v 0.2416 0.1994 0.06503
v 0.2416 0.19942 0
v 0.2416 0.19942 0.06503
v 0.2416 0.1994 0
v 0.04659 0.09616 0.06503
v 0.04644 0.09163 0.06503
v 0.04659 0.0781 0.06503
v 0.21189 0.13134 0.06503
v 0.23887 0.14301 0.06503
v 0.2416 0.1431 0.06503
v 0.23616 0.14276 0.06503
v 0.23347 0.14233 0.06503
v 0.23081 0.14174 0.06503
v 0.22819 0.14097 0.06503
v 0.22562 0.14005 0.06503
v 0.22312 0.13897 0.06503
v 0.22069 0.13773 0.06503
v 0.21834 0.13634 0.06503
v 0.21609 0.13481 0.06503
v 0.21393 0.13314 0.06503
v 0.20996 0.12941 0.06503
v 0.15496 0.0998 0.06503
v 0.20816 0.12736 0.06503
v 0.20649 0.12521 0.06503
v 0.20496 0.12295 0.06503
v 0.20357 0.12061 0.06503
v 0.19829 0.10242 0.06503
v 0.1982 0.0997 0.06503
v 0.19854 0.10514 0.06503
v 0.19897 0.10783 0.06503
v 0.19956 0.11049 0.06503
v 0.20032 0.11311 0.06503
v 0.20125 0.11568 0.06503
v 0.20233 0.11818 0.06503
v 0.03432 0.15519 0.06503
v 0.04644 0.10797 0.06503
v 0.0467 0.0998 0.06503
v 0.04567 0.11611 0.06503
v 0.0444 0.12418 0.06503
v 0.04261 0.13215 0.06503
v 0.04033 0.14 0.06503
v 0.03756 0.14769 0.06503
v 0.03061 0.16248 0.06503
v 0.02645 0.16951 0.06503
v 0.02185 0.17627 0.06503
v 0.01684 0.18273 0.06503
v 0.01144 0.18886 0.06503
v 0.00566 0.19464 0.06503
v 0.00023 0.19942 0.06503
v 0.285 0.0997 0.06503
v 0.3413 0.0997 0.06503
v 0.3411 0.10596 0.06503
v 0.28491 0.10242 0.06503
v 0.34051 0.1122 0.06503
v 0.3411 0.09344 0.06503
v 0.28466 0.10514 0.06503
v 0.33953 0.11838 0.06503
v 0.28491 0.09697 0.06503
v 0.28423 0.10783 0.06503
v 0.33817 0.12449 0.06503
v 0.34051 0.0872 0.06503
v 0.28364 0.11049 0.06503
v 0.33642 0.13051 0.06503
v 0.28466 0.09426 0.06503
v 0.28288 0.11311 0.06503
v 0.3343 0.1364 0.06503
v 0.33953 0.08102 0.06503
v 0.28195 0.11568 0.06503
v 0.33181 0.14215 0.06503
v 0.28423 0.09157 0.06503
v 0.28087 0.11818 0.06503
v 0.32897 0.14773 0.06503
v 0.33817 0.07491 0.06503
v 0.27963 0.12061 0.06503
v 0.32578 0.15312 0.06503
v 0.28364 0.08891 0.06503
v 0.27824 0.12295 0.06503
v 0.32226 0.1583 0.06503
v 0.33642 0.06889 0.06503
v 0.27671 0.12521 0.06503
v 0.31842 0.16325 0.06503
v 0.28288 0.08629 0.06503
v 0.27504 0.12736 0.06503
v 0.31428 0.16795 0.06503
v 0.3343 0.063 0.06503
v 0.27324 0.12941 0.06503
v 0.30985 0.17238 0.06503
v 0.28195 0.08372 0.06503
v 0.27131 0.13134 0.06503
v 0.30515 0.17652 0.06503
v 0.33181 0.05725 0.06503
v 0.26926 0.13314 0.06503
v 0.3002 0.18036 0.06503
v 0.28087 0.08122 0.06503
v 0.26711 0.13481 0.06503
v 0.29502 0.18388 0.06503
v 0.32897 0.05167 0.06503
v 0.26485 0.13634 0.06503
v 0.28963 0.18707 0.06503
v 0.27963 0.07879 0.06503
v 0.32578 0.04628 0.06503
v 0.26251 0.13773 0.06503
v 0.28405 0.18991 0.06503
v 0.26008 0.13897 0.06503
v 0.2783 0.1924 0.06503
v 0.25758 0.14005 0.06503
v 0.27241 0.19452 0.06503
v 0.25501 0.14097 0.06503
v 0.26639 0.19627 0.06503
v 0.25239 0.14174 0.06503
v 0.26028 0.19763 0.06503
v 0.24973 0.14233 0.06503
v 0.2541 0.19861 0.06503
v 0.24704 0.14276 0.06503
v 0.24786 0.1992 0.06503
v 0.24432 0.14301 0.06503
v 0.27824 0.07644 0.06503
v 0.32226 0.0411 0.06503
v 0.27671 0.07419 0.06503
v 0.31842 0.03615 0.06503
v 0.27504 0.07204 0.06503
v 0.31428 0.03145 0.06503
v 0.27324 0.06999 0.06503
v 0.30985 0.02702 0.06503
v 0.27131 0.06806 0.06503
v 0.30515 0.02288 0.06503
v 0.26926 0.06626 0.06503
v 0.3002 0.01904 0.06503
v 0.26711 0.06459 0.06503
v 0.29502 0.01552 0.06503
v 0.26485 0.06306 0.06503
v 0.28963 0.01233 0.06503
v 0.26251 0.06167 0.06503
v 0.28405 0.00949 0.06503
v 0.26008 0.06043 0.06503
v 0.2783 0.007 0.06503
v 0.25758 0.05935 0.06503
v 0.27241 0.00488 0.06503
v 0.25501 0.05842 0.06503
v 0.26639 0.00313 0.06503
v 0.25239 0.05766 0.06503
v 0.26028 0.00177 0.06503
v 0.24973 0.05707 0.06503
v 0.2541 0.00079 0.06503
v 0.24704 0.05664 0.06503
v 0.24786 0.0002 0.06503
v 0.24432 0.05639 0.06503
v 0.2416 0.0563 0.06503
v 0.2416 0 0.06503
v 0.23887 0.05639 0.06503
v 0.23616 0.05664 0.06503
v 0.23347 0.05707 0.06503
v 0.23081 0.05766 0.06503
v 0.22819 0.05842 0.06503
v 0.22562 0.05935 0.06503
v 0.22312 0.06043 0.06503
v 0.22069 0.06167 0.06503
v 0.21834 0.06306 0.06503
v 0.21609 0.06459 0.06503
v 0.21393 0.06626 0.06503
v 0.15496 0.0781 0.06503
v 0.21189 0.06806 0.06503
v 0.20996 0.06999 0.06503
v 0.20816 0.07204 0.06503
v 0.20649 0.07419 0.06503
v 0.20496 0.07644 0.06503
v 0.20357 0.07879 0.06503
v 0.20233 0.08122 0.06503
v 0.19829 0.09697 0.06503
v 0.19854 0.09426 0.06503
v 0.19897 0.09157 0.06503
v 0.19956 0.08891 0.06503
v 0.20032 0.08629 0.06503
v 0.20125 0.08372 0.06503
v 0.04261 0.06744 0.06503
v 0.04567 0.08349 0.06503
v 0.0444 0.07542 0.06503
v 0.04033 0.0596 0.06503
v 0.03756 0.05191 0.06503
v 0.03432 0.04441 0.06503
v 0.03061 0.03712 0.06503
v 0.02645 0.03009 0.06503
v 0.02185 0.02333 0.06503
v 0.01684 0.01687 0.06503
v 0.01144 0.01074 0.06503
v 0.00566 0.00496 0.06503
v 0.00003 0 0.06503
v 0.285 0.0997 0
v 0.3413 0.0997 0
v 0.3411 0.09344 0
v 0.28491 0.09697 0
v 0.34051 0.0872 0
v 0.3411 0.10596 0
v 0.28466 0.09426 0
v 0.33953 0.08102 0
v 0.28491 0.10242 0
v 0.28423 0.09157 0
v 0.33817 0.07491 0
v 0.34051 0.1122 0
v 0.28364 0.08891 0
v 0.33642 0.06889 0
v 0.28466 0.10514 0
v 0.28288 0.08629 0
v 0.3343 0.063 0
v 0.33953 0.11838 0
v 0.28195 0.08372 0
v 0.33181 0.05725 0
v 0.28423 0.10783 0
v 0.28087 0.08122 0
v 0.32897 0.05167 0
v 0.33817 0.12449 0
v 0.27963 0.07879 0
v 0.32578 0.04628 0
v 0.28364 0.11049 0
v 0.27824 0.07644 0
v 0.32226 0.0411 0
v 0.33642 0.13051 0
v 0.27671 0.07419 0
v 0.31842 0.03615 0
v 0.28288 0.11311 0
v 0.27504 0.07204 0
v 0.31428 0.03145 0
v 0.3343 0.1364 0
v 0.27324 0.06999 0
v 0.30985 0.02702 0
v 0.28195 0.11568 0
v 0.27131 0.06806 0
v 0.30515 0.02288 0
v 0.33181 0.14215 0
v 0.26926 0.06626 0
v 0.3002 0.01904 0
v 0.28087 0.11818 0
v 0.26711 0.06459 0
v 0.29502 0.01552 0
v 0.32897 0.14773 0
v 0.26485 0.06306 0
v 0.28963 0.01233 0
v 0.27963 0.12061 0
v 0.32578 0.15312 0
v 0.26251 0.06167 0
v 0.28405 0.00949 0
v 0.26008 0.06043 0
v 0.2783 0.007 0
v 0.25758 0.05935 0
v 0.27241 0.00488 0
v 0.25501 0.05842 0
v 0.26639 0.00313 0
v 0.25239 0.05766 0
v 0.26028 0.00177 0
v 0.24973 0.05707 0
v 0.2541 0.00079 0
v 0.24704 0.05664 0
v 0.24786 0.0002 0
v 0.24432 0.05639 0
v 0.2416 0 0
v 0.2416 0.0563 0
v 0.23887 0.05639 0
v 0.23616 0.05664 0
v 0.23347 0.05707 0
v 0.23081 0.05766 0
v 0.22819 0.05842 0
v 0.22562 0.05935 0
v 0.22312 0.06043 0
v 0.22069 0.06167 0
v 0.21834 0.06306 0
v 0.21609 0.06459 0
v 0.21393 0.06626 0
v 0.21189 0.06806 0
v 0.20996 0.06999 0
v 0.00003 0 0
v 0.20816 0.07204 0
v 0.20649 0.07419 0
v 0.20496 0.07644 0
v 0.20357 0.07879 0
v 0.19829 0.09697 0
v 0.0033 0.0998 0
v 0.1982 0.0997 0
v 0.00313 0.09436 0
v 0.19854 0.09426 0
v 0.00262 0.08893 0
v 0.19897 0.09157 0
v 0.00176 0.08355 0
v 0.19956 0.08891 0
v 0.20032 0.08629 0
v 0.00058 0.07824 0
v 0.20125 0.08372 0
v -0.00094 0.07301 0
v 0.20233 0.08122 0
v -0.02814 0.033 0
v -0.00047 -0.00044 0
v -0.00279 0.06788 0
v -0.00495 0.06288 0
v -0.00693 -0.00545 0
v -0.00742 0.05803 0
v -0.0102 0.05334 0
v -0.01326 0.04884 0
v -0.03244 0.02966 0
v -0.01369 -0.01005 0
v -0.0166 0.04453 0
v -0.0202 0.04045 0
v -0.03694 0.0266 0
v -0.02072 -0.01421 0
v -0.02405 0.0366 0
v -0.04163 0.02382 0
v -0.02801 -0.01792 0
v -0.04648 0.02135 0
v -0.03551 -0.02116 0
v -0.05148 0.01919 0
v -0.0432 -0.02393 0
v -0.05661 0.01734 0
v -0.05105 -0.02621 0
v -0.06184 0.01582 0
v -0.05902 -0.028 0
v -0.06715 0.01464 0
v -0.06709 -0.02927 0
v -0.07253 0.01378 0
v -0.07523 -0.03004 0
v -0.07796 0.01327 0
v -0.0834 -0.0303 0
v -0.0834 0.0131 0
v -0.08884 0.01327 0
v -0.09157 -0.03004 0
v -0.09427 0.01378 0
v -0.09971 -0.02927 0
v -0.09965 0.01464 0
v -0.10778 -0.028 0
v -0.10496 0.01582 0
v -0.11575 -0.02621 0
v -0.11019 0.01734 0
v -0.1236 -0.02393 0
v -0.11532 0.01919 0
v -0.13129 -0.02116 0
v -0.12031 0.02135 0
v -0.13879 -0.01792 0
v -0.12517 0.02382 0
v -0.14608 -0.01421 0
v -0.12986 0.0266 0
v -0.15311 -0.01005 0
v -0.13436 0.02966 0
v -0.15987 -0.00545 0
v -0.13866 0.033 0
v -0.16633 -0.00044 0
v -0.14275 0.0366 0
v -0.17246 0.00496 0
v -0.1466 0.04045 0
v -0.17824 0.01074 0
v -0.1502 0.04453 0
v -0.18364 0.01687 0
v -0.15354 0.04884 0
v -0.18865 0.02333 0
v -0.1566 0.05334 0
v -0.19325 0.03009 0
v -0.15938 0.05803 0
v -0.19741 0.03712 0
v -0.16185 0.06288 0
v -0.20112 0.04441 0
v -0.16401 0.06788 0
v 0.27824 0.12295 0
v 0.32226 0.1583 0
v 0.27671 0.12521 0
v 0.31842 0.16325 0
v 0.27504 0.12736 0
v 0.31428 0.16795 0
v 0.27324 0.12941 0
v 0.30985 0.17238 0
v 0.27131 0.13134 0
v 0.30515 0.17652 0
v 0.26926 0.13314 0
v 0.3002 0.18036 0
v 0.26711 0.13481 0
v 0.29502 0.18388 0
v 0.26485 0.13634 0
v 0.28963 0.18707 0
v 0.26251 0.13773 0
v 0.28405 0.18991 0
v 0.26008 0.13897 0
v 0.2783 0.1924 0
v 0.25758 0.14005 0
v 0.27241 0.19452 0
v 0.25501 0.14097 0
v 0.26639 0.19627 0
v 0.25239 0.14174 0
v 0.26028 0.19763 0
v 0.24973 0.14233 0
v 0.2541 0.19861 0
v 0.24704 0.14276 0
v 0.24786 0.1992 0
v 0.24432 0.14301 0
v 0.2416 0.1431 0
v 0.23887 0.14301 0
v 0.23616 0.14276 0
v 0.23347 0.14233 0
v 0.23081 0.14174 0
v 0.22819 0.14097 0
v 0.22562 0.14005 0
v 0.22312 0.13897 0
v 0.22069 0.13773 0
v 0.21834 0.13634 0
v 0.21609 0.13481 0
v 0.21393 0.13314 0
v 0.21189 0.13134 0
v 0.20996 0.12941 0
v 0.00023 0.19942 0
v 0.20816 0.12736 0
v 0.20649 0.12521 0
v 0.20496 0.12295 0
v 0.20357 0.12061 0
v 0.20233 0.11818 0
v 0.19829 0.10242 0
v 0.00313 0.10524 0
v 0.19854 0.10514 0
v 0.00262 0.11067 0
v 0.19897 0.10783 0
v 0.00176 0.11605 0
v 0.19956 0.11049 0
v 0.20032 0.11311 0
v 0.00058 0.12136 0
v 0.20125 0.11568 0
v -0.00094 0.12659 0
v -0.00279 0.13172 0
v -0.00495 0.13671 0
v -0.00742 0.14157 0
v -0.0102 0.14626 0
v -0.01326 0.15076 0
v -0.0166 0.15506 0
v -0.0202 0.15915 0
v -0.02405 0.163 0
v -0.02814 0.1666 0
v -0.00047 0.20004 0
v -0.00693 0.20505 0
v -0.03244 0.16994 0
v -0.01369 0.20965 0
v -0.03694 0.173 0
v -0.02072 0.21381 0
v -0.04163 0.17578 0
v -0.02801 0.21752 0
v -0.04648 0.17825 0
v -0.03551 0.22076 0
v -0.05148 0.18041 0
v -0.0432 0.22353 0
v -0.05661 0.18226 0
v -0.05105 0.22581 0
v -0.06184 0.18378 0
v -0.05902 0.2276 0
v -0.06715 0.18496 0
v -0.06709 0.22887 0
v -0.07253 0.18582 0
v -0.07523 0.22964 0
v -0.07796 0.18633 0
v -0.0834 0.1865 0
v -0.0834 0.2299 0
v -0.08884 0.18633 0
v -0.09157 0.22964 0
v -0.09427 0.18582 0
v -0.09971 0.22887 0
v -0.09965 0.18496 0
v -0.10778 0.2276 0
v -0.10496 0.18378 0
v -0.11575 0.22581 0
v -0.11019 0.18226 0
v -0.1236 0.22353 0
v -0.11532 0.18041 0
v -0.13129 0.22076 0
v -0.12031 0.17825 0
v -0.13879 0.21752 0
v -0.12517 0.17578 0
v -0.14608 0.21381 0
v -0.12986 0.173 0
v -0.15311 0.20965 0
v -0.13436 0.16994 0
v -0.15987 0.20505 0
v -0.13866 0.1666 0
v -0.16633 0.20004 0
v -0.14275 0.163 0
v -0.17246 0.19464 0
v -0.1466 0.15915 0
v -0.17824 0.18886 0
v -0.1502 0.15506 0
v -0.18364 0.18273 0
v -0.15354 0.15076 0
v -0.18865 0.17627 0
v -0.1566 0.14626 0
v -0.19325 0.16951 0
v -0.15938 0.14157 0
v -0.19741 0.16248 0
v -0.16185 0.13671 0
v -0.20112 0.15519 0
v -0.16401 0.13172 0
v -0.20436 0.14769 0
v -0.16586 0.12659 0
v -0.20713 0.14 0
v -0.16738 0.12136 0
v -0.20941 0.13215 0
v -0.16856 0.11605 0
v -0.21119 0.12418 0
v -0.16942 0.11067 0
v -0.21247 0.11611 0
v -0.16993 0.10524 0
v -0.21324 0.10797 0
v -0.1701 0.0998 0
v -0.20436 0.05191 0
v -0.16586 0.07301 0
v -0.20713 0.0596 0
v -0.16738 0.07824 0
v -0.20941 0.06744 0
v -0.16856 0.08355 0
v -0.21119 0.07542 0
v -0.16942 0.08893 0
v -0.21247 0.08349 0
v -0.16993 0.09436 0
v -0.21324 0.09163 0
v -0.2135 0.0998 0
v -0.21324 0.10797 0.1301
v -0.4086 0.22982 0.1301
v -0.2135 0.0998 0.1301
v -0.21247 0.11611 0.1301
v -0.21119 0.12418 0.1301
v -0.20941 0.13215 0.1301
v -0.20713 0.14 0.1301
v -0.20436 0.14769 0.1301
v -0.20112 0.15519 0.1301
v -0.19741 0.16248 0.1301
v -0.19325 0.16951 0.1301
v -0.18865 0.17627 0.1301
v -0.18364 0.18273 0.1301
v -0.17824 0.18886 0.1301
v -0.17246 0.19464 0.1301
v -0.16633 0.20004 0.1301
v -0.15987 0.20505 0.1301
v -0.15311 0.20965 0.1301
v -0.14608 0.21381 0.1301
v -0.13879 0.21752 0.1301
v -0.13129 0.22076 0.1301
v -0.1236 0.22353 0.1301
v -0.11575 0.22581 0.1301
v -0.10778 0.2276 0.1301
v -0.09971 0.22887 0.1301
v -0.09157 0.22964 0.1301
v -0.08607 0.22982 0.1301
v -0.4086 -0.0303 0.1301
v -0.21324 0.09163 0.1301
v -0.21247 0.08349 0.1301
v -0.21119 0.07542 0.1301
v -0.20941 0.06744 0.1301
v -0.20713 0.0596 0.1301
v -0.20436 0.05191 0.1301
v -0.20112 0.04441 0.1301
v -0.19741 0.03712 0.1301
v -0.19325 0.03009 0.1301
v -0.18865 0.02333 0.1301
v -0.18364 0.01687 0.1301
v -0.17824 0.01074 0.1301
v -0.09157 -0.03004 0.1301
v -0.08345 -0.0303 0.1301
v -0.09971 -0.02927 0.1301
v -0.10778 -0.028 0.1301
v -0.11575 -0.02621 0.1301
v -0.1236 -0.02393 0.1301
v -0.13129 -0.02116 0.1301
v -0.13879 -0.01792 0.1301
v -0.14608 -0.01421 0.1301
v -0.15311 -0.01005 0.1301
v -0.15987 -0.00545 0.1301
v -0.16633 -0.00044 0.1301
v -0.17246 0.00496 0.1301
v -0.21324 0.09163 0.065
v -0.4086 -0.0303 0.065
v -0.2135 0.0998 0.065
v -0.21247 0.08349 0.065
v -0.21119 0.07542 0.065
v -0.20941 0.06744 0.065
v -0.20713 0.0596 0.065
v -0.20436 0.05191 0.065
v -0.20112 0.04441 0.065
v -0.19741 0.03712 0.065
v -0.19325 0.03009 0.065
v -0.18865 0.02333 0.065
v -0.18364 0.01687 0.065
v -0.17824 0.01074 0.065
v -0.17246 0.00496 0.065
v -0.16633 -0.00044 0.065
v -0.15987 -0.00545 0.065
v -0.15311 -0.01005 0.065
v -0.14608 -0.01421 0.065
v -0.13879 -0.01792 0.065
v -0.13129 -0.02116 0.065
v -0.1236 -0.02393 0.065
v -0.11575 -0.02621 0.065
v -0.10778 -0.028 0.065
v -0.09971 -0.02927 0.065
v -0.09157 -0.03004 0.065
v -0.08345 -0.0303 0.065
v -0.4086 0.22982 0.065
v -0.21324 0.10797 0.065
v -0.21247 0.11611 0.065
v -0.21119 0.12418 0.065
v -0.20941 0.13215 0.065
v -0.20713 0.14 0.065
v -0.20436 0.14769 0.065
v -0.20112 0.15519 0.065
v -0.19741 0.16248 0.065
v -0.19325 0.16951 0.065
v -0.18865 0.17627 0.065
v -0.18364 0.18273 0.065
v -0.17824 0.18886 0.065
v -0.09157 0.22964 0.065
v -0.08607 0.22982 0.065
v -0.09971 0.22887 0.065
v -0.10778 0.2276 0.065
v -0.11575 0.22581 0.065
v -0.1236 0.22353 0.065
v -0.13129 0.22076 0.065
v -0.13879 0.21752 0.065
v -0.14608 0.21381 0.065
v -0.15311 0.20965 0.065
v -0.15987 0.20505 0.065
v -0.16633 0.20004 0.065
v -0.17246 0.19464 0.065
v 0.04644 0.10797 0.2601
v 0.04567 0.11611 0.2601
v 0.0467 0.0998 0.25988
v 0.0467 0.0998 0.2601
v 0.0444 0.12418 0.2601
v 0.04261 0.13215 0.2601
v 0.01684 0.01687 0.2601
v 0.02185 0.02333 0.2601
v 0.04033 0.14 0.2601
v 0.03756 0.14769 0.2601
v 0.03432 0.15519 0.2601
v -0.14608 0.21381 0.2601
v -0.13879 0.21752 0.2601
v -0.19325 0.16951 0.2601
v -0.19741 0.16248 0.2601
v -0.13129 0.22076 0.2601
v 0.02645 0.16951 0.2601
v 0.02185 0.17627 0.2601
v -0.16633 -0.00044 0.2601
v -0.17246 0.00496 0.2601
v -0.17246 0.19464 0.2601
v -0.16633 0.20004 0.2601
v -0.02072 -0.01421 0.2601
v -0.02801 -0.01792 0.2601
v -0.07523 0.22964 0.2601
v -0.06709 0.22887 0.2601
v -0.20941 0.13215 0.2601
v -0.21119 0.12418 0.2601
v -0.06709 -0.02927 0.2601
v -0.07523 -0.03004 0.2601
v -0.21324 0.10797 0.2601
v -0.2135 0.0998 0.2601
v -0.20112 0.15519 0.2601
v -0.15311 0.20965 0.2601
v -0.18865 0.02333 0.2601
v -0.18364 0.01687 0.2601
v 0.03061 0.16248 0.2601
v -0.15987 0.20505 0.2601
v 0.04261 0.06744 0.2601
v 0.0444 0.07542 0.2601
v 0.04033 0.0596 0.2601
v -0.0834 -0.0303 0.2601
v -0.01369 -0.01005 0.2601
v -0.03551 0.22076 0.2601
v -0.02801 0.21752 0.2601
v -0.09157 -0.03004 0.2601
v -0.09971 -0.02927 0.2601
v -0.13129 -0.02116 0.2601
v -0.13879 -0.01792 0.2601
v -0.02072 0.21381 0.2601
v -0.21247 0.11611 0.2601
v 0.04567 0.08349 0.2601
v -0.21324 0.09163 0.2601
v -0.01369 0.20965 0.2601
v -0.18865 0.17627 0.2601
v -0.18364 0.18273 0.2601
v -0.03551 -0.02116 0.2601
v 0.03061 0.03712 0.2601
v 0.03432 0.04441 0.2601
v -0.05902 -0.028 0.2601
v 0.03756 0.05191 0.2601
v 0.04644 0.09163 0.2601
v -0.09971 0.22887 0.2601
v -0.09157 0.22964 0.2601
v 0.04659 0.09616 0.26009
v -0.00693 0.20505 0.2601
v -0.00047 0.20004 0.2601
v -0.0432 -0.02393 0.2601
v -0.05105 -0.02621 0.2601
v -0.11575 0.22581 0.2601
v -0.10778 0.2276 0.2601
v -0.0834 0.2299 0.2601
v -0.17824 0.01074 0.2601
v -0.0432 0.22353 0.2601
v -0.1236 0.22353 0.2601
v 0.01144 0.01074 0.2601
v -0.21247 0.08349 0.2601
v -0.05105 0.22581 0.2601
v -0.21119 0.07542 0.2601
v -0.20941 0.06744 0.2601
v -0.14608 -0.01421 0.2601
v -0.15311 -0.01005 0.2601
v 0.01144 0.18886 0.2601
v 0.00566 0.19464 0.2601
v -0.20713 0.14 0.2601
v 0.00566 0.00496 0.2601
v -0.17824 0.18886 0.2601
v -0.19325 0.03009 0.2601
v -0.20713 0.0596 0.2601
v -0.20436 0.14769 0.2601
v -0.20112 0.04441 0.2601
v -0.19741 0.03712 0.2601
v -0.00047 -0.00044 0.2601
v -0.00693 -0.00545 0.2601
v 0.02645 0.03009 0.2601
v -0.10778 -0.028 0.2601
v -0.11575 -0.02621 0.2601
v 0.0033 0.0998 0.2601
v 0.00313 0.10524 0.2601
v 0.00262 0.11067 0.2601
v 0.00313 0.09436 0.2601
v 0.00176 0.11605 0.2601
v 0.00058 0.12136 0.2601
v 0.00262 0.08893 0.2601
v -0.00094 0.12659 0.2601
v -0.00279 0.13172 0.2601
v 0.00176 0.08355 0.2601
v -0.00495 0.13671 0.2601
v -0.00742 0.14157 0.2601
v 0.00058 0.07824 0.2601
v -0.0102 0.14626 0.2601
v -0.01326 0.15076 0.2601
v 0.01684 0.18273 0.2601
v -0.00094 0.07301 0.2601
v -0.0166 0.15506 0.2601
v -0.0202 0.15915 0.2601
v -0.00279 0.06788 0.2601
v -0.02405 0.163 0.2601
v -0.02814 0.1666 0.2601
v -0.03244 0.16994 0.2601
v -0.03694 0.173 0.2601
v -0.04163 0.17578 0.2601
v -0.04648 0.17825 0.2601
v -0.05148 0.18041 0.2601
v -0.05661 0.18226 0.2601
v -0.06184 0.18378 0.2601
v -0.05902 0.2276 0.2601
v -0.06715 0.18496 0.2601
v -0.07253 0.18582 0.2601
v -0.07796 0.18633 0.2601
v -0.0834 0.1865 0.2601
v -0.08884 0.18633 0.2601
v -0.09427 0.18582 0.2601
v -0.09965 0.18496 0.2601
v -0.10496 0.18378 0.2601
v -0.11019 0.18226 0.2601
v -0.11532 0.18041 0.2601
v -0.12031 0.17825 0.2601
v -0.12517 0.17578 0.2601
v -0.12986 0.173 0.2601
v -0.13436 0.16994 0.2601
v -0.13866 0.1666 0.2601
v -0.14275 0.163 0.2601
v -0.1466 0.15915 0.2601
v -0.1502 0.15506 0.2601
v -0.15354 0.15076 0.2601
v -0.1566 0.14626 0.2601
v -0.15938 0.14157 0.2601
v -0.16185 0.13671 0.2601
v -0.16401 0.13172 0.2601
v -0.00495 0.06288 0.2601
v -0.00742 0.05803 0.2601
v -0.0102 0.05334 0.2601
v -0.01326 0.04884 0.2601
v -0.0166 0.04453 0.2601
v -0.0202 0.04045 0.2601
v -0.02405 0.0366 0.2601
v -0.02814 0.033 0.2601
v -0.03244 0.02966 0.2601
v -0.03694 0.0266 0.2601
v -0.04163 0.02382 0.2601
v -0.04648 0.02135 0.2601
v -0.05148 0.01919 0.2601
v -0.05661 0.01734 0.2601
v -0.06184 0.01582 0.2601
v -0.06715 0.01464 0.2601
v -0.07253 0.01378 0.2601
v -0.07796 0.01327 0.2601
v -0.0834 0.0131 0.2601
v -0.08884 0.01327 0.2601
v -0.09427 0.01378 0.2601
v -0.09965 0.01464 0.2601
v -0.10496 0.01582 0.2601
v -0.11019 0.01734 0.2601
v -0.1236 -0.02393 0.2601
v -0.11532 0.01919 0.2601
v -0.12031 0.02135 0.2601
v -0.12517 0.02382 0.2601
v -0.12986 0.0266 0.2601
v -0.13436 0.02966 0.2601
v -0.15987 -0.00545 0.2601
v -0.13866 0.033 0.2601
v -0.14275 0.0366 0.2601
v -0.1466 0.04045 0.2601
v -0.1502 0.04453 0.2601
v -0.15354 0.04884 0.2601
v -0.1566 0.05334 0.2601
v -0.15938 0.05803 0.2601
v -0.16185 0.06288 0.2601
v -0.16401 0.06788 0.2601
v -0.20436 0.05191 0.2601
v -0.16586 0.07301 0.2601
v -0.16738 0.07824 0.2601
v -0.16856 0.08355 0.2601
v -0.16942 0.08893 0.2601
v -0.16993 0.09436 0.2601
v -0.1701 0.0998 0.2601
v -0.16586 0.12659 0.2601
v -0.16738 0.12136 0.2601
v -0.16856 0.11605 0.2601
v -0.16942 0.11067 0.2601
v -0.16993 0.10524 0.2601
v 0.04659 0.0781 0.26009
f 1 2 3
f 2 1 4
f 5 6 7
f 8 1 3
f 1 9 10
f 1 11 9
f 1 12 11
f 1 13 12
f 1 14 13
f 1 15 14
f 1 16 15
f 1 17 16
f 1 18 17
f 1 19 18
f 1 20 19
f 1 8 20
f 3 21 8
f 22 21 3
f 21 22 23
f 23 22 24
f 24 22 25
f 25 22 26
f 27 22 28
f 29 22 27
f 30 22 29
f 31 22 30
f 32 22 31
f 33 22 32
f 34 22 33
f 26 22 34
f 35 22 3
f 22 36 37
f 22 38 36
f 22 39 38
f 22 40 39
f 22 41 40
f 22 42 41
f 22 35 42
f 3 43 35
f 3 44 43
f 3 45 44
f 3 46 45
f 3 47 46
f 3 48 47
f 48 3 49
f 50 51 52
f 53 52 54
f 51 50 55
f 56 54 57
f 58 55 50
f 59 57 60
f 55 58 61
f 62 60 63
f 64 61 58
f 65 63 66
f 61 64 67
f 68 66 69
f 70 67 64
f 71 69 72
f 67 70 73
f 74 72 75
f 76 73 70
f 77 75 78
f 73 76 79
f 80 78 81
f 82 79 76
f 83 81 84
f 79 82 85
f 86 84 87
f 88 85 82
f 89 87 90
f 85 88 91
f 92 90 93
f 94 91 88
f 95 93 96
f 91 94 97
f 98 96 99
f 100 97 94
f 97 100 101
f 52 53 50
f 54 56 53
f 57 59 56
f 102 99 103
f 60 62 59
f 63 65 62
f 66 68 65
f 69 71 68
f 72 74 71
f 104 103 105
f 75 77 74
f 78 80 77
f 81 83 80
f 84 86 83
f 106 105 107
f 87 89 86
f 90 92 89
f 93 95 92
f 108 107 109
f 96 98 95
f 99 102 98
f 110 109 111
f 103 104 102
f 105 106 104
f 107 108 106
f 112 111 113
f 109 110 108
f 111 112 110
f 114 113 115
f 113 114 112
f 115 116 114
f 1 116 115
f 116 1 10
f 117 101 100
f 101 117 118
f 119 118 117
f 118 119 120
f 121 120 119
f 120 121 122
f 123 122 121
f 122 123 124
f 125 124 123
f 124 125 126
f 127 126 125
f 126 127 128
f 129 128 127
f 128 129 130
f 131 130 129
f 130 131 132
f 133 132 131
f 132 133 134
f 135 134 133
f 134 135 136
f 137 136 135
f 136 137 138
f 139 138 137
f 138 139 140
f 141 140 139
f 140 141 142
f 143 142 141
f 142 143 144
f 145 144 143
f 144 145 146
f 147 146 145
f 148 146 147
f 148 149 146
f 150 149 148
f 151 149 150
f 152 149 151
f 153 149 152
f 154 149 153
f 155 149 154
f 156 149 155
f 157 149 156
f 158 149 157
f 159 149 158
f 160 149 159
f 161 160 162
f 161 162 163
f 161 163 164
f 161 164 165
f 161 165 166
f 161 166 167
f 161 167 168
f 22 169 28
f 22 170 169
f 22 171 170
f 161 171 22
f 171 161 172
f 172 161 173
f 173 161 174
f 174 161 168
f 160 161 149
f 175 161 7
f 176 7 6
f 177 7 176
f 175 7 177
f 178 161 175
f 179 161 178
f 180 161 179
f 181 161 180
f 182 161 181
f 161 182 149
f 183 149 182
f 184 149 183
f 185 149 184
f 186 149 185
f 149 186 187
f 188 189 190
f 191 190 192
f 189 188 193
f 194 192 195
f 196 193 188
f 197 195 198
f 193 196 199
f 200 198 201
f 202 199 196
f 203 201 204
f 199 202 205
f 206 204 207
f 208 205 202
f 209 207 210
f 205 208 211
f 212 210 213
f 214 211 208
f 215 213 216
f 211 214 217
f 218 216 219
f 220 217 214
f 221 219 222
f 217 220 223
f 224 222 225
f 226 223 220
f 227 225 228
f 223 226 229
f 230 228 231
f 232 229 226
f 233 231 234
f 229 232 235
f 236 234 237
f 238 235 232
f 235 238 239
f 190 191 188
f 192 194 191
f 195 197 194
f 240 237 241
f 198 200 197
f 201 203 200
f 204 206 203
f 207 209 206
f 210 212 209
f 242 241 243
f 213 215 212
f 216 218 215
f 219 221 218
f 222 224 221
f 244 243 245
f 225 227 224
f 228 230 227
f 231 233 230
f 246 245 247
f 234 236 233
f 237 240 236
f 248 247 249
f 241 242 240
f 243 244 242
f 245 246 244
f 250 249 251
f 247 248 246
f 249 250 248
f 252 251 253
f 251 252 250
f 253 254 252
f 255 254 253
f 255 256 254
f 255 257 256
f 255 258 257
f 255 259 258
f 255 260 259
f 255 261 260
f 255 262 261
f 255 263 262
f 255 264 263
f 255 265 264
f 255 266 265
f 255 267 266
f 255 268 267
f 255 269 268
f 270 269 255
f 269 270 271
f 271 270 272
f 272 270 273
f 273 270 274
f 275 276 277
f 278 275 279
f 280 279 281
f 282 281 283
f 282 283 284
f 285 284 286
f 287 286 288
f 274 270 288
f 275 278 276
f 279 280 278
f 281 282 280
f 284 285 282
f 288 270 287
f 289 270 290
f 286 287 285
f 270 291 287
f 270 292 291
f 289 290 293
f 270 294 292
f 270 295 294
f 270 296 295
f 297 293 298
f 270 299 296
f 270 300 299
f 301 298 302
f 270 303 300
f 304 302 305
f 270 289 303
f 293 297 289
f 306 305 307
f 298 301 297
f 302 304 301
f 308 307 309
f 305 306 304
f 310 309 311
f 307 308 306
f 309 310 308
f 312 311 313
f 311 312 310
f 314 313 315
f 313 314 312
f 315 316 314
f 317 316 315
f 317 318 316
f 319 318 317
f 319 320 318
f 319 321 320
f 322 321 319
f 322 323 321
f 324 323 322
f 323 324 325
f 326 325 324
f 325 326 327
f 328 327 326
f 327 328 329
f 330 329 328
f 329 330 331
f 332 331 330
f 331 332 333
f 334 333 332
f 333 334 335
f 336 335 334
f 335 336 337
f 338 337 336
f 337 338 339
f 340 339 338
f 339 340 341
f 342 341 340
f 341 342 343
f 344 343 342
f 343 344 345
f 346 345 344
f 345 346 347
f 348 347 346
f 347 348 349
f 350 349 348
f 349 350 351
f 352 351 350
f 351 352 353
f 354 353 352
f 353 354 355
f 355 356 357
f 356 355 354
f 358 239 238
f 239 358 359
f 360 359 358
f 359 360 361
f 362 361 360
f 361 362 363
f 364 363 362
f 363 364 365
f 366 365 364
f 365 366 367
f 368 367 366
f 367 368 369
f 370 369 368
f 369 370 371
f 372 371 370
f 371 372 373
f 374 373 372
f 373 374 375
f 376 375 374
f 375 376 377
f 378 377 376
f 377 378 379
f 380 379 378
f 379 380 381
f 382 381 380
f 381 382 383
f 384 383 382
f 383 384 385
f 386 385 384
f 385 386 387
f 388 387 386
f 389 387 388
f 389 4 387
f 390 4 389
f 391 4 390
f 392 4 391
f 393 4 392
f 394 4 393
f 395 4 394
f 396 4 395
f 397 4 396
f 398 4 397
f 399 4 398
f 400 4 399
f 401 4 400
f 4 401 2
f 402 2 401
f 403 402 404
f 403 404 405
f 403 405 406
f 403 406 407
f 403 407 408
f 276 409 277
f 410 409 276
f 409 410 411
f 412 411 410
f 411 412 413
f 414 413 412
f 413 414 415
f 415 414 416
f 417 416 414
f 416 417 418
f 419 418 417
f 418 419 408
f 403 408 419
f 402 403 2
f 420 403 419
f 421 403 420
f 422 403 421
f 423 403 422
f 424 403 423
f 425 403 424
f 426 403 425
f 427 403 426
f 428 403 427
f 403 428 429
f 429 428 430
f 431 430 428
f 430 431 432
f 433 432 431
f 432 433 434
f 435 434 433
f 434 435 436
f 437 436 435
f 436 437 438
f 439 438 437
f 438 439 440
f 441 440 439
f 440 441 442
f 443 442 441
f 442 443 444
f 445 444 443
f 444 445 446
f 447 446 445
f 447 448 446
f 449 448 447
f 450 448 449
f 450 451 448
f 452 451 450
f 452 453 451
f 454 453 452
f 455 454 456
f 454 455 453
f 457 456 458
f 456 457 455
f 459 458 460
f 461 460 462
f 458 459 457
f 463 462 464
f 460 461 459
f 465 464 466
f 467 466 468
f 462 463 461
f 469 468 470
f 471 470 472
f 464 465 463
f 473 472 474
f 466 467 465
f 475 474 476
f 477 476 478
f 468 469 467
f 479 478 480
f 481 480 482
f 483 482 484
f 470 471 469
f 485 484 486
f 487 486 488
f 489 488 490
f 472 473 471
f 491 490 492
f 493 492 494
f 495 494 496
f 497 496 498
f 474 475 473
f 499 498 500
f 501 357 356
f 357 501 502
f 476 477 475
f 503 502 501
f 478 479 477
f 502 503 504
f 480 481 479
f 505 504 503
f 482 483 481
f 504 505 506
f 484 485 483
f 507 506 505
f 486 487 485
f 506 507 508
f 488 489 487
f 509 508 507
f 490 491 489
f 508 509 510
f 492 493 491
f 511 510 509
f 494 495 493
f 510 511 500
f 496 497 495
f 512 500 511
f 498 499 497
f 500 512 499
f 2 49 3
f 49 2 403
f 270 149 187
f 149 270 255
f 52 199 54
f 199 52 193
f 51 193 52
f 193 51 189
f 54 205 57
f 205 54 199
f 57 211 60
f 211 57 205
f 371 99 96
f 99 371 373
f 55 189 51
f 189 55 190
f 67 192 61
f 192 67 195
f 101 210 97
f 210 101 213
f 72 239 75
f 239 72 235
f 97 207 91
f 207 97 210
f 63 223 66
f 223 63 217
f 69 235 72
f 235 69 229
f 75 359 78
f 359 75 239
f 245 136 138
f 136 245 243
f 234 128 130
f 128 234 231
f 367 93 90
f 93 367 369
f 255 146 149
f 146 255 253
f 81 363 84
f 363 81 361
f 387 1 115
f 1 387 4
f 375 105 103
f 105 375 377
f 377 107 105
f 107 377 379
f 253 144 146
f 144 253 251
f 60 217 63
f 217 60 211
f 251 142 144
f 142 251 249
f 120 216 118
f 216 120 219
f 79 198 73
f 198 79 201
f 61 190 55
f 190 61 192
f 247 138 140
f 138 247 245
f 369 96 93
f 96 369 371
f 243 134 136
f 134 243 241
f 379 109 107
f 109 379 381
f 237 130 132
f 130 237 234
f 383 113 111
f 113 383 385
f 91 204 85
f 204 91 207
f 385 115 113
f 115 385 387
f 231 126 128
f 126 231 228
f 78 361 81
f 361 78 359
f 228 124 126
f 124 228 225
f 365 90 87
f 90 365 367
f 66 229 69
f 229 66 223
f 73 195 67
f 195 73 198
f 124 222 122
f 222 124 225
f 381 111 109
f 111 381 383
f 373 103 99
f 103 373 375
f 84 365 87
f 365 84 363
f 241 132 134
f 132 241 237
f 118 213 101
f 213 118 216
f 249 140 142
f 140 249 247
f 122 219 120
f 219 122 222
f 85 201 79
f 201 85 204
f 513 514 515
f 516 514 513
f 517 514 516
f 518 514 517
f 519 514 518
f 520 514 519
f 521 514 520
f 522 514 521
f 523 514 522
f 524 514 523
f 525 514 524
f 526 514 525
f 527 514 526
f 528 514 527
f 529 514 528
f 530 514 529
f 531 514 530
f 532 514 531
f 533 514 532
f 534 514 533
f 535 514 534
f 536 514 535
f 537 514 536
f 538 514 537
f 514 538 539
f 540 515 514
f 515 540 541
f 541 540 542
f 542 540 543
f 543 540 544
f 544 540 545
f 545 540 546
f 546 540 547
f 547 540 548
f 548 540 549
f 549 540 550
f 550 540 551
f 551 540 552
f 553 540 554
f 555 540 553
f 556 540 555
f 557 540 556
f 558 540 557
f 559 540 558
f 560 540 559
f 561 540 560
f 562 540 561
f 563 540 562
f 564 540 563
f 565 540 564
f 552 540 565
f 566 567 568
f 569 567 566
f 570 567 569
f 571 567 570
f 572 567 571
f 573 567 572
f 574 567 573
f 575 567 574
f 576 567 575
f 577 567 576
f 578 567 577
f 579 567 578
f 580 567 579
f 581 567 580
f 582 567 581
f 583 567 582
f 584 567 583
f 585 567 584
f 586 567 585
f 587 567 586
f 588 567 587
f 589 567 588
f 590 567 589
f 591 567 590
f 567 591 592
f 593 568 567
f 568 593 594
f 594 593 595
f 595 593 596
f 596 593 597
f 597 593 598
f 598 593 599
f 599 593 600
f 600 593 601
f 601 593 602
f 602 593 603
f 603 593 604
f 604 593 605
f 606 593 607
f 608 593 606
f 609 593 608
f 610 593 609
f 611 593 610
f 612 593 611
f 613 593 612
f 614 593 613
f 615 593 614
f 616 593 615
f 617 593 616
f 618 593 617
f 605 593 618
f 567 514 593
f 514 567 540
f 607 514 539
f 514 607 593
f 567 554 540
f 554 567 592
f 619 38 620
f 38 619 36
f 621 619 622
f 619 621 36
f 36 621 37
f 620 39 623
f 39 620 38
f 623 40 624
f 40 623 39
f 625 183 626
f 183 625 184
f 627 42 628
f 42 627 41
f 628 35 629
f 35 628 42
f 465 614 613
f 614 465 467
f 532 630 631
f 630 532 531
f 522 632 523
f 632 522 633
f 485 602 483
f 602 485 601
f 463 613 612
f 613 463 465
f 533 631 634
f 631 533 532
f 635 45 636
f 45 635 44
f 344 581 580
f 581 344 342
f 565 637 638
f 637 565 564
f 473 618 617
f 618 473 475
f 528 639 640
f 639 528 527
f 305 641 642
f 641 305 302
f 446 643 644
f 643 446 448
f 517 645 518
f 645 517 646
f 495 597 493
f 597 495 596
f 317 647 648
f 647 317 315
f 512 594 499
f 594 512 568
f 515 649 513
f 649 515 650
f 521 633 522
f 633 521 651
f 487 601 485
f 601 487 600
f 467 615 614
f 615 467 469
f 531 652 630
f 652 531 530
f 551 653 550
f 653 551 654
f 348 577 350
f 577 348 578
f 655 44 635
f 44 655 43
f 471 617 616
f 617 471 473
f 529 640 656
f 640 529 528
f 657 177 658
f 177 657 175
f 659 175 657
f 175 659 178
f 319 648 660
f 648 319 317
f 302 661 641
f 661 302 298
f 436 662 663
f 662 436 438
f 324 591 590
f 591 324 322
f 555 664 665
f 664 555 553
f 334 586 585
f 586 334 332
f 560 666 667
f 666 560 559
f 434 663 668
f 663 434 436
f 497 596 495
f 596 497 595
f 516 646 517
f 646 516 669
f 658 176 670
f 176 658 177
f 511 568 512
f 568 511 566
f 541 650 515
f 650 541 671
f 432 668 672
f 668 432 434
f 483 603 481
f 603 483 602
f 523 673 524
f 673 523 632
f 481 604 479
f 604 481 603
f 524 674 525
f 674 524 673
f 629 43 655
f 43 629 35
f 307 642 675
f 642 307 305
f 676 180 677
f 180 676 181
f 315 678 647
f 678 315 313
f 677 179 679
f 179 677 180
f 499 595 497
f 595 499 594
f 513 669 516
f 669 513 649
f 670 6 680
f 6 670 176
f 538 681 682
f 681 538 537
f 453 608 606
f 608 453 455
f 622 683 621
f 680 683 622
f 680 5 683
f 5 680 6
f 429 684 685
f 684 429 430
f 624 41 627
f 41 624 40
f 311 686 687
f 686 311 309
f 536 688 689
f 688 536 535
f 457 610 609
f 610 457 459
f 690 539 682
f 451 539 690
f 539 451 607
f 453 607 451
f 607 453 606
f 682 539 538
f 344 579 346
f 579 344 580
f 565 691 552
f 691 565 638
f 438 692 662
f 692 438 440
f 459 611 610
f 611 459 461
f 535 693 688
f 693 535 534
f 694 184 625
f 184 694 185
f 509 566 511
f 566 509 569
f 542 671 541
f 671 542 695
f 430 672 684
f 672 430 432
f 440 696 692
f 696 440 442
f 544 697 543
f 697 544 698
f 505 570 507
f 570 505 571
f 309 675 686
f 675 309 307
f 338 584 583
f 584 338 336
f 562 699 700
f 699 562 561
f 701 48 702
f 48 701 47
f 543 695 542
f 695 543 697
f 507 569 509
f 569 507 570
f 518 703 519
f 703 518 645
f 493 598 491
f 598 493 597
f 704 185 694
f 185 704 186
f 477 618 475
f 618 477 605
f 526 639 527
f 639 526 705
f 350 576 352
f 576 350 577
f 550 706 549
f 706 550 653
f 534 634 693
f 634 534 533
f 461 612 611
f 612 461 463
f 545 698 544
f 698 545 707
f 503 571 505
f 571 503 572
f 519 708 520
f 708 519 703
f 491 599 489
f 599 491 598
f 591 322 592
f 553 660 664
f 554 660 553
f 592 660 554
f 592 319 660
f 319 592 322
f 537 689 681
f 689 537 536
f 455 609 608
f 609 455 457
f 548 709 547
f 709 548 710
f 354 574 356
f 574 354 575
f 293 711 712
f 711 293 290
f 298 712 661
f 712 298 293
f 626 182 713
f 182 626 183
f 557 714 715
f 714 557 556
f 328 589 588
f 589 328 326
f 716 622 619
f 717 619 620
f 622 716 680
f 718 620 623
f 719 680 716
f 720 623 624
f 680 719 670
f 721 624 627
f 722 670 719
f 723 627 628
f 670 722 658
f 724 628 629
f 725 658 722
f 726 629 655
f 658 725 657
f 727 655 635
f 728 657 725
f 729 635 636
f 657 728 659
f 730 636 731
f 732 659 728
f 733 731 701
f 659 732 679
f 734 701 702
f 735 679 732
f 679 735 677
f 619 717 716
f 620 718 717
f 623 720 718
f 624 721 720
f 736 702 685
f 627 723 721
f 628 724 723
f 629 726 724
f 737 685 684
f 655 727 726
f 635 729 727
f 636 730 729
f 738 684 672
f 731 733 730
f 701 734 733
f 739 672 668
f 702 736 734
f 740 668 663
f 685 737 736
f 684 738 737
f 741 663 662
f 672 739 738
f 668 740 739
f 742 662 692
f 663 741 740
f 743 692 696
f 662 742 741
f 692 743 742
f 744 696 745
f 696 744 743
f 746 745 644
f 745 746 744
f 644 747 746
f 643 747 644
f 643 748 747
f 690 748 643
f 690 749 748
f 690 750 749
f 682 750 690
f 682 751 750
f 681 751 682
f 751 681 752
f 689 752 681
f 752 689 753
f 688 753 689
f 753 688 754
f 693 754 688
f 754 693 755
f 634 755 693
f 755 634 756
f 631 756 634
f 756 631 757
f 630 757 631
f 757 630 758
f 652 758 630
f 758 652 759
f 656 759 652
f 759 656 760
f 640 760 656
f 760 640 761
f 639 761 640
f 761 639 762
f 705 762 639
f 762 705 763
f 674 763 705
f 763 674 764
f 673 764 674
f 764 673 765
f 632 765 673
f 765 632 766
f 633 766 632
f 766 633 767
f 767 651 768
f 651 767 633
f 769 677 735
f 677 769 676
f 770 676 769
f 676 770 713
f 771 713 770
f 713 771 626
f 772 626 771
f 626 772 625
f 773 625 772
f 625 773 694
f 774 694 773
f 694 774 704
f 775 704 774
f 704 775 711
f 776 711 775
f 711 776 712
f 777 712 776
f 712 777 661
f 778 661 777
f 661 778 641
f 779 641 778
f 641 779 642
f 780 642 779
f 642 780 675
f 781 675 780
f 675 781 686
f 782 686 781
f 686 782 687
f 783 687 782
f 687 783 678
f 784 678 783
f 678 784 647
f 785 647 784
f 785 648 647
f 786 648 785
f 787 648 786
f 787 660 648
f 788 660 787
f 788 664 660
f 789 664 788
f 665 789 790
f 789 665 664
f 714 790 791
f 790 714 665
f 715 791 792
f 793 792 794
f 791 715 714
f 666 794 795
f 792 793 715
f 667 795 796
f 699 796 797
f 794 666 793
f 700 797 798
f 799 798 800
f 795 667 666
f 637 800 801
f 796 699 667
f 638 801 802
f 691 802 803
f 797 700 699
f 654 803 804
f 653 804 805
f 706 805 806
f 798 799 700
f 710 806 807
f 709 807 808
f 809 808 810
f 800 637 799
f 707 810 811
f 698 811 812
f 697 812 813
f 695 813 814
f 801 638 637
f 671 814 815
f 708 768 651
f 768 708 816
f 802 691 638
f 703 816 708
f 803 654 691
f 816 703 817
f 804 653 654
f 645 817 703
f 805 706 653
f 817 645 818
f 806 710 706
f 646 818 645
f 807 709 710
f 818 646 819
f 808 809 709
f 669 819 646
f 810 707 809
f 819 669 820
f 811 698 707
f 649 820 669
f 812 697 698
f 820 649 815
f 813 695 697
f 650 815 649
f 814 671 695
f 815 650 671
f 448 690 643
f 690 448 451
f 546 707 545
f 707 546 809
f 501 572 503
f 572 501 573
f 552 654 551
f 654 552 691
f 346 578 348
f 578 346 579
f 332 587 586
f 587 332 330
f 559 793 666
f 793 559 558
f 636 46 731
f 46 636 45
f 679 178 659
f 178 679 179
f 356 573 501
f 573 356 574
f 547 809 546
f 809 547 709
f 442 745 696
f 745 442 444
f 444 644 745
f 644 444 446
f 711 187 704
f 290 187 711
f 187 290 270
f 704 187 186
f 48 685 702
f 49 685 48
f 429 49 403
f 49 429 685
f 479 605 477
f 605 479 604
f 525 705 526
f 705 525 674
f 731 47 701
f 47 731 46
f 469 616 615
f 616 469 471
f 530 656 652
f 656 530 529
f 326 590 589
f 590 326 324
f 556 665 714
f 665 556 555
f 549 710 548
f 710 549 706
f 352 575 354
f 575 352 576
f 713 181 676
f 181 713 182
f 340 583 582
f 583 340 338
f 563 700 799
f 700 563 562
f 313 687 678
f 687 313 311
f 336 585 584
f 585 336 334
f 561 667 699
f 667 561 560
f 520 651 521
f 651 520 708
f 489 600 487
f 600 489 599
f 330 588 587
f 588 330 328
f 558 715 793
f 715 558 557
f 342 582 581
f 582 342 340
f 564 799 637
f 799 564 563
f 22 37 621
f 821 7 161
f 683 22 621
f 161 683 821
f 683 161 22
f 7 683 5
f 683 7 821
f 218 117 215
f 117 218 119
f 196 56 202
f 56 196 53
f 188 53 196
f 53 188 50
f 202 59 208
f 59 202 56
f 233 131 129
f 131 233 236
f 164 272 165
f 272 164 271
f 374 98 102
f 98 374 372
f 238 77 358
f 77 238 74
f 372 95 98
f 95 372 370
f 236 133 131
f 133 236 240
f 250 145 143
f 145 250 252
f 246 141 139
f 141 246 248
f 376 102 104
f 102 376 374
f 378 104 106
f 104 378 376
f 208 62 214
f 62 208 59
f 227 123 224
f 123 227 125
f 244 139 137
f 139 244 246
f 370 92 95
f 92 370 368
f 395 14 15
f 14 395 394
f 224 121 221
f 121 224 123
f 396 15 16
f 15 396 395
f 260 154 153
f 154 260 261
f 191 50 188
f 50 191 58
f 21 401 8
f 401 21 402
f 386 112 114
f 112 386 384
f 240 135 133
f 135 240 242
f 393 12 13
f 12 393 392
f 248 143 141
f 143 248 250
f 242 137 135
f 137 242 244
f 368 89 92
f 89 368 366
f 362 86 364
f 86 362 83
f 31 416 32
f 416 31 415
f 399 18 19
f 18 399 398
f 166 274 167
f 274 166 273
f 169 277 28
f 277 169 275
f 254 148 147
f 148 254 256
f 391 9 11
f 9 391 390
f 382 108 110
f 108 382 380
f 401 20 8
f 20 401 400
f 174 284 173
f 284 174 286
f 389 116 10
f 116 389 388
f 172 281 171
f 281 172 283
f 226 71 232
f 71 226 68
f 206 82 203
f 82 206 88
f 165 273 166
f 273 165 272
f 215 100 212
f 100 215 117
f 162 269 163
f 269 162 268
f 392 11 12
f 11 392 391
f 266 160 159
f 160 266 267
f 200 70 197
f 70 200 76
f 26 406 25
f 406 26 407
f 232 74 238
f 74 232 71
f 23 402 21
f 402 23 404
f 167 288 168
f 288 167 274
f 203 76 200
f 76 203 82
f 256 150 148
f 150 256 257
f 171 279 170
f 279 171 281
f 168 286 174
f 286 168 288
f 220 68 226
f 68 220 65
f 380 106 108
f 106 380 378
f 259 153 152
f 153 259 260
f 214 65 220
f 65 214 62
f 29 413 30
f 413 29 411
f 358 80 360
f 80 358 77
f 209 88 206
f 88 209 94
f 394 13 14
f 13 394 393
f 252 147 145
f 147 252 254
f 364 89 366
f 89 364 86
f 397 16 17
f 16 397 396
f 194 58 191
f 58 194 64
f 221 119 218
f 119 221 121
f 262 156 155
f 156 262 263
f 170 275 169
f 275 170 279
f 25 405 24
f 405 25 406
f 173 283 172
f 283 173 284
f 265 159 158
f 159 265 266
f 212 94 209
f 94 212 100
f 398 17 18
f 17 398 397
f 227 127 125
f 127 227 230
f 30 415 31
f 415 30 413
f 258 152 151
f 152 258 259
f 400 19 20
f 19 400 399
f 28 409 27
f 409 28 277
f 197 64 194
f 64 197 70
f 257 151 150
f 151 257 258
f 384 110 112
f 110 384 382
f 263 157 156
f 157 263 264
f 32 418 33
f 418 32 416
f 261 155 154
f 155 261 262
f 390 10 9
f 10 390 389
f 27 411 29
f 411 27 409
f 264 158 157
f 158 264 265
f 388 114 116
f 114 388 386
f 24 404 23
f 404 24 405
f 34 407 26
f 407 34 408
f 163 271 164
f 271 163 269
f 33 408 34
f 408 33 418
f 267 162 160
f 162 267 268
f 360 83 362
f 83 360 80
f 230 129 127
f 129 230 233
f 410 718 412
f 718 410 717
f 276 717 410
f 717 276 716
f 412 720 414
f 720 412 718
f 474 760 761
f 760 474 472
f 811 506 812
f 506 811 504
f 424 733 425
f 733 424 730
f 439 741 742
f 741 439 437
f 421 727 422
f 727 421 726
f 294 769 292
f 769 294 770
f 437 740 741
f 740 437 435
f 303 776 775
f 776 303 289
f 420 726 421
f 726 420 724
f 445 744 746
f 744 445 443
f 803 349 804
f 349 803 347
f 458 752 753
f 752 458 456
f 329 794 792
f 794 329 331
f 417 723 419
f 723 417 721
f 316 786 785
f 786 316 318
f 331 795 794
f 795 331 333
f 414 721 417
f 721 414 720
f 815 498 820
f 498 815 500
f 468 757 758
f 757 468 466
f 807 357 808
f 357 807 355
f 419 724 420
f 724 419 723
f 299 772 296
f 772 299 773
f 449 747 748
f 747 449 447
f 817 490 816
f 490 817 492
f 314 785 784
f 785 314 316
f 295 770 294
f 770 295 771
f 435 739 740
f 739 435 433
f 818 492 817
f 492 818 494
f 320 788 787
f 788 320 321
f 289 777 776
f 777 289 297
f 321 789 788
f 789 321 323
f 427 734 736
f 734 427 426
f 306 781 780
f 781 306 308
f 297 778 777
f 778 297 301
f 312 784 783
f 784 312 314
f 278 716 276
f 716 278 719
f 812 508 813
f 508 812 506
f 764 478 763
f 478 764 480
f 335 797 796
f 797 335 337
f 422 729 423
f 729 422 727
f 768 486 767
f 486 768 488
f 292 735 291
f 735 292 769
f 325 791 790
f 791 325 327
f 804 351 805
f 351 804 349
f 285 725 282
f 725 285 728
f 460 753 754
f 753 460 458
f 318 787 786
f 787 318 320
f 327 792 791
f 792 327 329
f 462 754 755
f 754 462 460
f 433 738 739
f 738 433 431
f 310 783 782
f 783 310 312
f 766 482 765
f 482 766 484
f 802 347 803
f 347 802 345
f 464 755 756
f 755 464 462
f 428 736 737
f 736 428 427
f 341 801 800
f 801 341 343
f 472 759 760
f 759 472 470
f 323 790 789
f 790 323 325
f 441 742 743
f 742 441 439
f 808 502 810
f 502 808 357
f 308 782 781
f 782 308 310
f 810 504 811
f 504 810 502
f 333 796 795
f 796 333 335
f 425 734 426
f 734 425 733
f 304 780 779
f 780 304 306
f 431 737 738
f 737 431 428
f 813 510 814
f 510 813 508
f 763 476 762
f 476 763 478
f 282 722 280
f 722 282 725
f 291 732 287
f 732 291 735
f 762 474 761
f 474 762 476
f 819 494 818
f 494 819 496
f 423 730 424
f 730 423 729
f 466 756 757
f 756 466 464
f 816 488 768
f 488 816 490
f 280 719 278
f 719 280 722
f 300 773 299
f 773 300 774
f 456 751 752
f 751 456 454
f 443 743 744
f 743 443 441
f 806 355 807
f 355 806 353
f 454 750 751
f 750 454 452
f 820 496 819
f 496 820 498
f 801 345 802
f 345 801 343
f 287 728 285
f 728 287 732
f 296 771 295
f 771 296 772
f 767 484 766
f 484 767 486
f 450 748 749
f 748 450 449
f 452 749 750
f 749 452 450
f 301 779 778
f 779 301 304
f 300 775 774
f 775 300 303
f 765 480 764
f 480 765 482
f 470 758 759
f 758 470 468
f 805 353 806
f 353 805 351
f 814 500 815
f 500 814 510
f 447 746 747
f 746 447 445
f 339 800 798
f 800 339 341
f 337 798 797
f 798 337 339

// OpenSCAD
// Parameters
$fn = 100;
eps = 0.001;

// Base parameters
base_length    = 0.341352;
base_width     = 0.199422;
base_height    = 0.065029;
base_center_x  = 0.2416;
base_center_y  = 0.0997;
base_outer_r   = 0.0997;
base_inner_r   = 0.0434;

// Sleeve parameters
sleeve_x       = -0.0834;
sleeve_y       = 0.0998;
sleeve_outer_r = 0.1301;
sleeve_inner_r = 0.0867;
sleeve_height  = 0.2601;

// Arm parameters
arm_length     = 0.325145;
arm_width      = 0.260116;
arm_x_min      = -0.4086;
arm_y_min      = -0.0303;
arm_z_min      = 0.065;
arm_z_max      = 0.1301;

// Triangular web parameters
web_run        = 0.108382;
web_thickness  = 0.0217;
web_x_min      = 0.0466;
web_x_max      = web_x_min + web_run;
web_y_min      = 0.0781;
web_y_max      = web_y_min + web_thickness;
web_z_min      = 0.065029;
web_z_max      = 0.2601;

// Solid body assembly
difference() {
    union() {
        // Base plate: rectangular section and rounded end
        cube([base_center_x, base_width, base_height]);
        translate([base_center_x, base_center_y, 0])
            cylinder(h=base_height, r=base_outer_r);

        // Raised stepped arm tier
        translate([arm_x_min, arm_y_min, arm_z_min])
            cube([arm_length, arm_width, arm_z_max - arm_z_min]);

        // Taller sleeve outer cylinder
        translate([sleeve_x, sleeve_y, 0])
            cylinder(h=sleeve_height, r=sleeve_outer_r);

        // Triangular stiffening web
        translate([0, web_y_max, 0])
            rotate([90, 0, 0])
                linear_extrude(height=web_thickness)
                    polygon([
                        [web_x_min, web_z_min],
                        [web_x_max, web_z_min],
                        [web_x_min, web_z_max]
                    ]);
    }

    // Base through-hole
    translate([base_center_x, base_center_y, -eps])
        cylinder(h=base_height + 2*eps, r=base_inner_r);

    // Sleeve central through-bore
    translate([sleeve_x, sleeve_y, -eps])
        cylinder(h=sleeve_height + 2*eps, r=sleeve_inner_r);
}
